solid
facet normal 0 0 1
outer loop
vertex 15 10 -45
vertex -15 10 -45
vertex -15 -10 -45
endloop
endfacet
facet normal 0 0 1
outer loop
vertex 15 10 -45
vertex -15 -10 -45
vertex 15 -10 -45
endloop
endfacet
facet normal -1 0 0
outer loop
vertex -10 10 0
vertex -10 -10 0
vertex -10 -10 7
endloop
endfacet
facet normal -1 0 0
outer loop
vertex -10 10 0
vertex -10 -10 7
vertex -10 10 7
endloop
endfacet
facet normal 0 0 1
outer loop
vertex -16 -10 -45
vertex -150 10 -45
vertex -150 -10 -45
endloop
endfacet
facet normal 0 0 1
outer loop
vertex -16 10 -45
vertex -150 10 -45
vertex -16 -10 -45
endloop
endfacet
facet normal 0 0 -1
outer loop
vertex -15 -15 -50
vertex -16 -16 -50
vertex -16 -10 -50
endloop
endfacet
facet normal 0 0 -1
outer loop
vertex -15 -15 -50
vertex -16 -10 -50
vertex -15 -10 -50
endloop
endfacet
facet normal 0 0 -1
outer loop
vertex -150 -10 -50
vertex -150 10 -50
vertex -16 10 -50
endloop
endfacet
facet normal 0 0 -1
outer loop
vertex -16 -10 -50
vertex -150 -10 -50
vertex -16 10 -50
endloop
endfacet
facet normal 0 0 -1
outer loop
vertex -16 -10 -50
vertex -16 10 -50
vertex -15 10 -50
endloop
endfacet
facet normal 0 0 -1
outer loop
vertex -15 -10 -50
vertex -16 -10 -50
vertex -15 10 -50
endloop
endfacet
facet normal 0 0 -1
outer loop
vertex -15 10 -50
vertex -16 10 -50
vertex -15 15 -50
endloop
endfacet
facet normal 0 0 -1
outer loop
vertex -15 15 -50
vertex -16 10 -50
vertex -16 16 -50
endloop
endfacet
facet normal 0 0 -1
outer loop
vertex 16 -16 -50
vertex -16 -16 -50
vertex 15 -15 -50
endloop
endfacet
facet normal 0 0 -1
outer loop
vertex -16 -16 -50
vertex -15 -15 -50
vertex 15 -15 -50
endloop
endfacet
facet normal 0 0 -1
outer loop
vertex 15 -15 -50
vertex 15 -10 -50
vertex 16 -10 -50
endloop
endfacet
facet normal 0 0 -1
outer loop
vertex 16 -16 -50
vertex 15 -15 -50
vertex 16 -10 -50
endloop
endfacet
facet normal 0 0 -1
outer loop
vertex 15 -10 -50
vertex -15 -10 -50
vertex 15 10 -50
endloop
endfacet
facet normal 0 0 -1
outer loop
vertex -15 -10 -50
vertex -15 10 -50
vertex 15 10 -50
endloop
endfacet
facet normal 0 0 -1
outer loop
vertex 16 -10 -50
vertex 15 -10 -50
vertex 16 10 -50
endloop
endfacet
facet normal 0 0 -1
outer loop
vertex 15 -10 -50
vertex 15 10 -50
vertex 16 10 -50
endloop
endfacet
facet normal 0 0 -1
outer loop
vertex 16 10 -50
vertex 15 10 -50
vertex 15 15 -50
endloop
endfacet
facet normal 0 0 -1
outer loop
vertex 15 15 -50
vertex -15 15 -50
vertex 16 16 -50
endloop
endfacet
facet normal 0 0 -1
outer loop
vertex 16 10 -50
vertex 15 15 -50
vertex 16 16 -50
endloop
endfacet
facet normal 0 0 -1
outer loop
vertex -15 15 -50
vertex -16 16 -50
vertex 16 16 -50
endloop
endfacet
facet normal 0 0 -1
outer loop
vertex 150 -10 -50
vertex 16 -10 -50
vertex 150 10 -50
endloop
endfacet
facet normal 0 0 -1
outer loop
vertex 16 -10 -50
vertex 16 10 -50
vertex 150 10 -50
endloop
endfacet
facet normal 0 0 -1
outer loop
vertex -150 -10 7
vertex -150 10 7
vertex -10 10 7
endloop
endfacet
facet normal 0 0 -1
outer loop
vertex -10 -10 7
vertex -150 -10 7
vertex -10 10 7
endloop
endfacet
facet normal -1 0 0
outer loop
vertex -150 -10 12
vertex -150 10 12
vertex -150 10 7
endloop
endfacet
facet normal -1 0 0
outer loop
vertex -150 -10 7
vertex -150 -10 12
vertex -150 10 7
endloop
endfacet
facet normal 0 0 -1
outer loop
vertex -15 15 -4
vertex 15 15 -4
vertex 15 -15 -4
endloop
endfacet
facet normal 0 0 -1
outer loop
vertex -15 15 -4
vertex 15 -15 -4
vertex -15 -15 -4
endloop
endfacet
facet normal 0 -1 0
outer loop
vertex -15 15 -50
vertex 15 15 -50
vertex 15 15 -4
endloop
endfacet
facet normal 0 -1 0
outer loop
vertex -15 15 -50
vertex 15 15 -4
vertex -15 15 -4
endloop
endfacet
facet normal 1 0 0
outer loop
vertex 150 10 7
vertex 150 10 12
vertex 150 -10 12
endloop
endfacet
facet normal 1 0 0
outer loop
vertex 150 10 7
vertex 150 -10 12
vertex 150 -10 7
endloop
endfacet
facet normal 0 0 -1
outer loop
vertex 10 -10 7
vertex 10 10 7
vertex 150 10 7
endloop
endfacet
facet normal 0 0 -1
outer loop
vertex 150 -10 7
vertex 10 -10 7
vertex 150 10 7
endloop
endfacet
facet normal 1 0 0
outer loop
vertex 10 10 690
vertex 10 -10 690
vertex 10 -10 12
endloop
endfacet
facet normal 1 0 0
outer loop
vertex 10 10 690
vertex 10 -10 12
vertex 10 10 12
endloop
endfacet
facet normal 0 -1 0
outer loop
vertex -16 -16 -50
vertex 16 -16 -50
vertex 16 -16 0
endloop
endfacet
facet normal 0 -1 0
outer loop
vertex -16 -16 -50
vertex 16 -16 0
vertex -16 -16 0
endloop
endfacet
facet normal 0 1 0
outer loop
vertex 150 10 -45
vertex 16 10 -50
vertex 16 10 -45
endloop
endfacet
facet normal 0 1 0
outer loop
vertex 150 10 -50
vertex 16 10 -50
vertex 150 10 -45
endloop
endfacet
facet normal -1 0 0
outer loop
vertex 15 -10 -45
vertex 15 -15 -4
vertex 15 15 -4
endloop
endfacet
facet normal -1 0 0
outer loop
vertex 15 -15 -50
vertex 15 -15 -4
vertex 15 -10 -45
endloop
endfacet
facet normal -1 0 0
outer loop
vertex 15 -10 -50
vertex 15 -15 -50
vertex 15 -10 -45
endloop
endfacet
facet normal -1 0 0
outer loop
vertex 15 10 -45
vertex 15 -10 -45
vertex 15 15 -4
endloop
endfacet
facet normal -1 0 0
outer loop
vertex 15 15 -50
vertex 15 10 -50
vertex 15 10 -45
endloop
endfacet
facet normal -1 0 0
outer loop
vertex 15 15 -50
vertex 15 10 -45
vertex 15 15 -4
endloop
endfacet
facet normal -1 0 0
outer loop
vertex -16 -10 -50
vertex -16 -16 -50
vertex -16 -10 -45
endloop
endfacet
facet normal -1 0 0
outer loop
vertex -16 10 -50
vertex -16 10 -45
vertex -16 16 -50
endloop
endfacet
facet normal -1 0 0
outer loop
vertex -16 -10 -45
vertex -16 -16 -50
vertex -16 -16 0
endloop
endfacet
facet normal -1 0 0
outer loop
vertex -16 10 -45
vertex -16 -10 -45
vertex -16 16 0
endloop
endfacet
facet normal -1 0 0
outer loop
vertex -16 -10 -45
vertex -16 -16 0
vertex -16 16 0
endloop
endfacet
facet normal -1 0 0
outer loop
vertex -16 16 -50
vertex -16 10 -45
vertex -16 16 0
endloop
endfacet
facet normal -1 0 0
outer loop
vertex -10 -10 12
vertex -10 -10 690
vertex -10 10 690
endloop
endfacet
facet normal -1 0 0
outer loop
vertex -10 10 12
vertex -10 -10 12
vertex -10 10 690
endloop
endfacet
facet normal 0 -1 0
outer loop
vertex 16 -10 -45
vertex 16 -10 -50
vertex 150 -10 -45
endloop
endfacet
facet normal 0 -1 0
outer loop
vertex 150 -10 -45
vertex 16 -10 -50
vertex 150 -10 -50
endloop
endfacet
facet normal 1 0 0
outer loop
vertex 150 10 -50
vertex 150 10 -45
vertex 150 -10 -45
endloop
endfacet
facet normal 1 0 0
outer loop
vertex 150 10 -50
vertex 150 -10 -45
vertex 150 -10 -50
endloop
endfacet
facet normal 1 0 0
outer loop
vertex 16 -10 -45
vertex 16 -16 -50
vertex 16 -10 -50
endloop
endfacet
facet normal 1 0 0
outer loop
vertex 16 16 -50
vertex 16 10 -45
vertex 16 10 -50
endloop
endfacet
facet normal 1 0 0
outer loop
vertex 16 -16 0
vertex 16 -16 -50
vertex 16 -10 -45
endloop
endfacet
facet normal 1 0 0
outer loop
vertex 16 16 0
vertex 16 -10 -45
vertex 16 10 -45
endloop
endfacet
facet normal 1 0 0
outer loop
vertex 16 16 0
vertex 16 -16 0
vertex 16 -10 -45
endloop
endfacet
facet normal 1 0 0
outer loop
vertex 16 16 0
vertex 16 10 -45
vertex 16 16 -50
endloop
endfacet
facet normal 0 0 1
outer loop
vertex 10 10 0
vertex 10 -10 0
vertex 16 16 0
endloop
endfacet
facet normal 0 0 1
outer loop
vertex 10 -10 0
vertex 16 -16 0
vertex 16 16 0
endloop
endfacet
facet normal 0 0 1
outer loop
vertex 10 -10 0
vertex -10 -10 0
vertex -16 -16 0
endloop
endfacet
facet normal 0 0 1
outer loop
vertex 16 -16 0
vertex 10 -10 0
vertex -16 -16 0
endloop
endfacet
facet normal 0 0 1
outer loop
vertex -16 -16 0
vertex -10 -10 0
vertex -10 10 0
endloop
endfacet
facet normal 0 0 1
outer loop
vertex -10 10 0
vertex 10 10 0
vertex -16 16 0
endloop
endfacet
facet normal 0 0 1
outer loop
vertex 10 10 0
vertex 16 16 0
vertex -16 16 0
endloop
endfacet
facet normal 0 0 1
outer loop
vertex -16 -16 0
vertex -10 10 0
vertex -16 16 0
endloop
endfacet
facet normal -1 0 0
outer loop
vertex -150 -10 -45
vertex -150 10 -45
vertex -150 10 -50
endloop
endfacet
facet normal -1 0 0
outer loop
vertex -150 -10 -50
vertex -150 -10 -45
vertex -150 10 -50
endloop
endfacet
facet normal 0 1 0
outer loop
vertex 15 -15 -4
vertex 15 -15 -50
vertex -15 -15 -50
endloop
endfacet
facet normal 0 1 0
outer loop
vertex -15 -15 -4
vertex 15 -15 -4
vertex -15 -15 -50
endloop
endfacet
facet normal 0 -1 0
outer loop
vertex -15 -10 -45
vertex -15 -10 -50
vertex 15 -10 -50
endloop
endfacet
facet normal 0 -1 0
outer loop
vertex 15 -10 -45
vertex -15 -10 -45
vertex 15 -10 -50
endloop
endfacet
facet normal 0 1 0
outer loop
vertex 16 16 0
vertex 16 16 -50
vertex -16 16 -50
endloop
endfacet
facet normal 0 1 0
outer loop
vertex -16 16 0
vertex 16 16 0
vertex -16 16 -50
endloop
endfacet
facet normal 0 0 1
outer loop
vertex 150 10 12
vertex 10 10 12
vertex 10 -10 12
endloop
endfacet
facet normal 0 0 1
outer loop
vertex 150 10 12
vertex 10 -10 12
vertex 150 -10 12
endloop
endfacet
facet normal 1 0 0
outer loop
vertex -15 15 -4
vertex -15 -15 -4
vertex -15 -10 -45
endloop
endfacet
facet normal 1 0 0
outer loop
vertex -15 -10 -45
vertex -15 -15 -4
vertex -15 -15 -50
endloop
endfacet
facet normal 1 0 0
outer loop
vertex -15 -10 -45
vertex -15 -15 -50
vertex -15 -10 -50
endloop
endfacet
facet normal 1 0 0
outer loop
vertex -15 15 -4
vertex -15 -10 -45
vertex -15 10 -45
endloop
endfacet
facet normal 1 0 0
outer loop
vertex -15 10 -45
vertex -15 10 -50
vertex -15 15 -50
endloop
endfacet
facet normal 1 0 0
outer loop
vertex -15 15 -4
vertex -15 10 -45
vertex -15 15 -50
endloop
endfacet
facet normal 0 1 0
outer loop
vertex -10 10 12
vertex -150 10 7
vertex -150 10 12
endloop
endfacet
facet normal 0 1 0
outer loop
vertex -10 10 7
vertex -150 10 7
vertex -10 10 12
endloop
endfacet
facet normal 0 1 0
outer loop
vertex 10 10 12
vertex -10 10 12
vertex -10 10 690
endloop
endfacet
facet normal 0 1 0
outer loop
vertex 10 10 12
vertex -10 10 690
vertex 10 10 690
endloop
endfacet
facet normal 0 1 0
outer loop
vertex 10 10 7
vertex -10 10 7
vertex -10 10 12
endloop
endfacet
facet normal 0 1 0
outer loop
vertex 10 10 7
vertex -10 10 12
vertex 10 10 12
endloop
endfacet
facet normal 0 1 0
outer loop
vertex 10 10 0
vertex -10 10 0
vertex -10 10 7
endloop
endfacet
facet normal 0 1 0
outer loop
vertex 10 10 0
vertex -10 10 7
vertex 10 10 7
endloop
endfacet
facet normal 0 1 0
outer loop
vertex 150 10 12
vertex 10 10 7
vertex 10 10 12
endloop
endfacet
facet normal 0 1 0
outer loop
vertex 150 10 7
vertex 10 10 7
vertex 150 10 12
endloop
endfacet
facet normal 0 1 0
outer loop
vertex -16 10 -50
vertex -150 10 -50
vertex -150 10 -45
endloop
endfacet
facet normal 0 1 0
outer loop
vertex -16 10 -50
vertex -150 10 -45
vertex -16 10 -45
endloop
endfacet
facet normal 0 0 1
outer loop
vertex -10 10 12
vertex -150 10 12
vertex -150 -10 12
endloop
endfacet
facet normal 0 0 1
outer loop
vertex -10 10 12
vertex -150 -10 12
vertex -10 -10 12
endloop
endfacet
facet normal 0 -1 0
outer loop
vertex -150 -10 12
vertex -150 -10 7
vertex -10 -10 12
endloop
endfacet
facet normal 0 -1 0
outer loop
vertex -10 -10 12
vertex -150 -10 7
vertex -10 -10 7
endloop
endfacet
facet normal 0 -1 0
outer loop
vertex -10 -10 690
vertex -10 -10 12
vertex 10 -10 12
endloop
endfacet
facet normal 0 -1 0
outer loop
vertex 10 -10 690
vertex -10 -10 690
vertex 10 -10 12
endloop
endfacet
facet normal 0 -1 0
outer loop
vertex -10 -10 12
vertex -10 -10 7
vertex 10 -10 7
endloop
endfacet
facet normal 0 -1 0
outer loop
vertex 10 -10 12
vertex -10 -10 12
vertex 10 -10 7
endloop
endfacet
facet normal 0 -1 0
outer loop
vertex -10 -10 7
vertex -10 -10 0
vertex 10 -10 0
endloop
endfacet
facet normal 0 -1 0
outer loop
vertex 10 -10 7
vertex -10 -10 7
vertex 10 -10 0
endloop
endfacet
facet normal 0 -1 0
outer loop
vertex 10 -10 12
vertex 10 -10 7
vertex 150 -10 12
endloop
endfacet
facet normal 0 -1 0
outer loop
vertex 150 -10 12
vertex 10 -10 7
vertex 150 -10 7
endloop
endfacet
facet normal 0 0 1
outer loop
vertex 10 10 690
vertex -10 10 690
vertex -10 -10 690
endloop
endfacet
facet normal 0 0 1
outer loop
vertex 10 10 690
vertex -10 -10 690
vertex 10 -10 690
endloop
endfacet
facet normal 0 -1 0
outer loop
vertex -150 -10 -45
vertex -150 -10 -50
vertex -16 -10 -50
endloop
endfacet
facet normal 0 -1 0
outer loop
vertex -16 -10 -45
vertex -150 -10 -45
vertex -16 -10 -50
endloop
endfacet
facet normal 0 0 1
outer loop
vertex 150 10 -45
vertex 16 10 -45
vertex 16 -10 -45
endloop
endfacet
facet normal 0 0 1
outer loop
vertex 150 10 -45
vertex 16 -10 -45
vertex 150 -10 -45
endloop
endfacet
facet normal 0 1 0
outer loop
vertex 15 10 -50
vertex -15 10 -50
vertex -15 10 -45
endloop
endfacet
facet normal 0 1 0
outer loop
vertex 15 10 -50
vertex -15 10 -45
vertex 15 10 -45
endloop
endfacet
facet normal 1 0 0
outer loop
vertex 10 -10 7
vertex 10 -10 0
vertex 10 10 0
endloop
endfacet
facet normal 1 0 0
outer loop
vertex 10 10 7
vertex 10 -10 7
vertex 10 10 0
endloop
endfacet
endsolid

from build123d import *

# Parameters (mm, degrees)
SKETCH_1_W             = 20
SKETCH_1_H             = 20
EXTRUDE_1_DEPTH        = 690
SKETCH_2_W             = 32
SKETCH_2_H             = 32
EXTRUDE_2_DEPTH        = 50
SKETCH_3_W             = 30
SKETCH_3_H             = 30
CUT_EXTRUDE_1_DEPTH    = 46
SKETCH_4_W             = 300
SKETCH_4_H             = 5
EXTRUDE_3_DEPTH        = 20
PATTERN_LINEAR_1_COUNT = 2
PATTERN_LINEAR_1_PITCH = 57


with BuildPart() as part:
    # 草图1 → 凸台-拉伸1 (new body)
    with BuildSketch(Plane.XY):
        Rectangle(SKETCH_1_W, SKETCH_1_H)
    extrude(amount=EXTRUDE_1_DEPTH)

    # 草图2 → 凸台-拉伸2 (add)
    with BuildSketch(Plane(origin=(0, 0, 0), x_dir=(-1, 0, 0), z_dir=(0, 0, -1))):
        Rectangle(SKETCH_2_W, SKETCH_2_H)
    extrude(amount=EXTRUDE_2_DEPTH)

    # 草图3 → 切除-拉伸1 (cut)
    with BuildSketch(Plane(origin=(0, 0, -50), x_dir=(-1, 0, 0), z_dir=(0, 0, -1))):
        Rectangle(SKETCH_3_W, SKETCH_3_H)
    extrude(amount=-CUT_EXTRUDE_1_DEPTH, mode=Mode.SUBTRACT)

    # 草图4 → 凸台-拉伸3 (add)
    with BuildSketch(Plane(origin=(0, 10, 0), x_dir=(1, 0, 0), z_dir=(0, 1, 0))):
        with Locations((0, 47.5)):
            Rectangle(SKETCH_4_W, SKETCH_4_H)
    extrude_3 = extrude(amount=-EXTRUDE_3_DEPTH)

    # 阵列(线性)1: 凸台-拉伸3 ×2
    with Locations(*[(0, 0, i * PATTERN_LINEAR_1_PITCH) for i in range(1, PATTERN_LINEAR_1_COUNT)]):
        add(extrude_3)


solid = part.part
